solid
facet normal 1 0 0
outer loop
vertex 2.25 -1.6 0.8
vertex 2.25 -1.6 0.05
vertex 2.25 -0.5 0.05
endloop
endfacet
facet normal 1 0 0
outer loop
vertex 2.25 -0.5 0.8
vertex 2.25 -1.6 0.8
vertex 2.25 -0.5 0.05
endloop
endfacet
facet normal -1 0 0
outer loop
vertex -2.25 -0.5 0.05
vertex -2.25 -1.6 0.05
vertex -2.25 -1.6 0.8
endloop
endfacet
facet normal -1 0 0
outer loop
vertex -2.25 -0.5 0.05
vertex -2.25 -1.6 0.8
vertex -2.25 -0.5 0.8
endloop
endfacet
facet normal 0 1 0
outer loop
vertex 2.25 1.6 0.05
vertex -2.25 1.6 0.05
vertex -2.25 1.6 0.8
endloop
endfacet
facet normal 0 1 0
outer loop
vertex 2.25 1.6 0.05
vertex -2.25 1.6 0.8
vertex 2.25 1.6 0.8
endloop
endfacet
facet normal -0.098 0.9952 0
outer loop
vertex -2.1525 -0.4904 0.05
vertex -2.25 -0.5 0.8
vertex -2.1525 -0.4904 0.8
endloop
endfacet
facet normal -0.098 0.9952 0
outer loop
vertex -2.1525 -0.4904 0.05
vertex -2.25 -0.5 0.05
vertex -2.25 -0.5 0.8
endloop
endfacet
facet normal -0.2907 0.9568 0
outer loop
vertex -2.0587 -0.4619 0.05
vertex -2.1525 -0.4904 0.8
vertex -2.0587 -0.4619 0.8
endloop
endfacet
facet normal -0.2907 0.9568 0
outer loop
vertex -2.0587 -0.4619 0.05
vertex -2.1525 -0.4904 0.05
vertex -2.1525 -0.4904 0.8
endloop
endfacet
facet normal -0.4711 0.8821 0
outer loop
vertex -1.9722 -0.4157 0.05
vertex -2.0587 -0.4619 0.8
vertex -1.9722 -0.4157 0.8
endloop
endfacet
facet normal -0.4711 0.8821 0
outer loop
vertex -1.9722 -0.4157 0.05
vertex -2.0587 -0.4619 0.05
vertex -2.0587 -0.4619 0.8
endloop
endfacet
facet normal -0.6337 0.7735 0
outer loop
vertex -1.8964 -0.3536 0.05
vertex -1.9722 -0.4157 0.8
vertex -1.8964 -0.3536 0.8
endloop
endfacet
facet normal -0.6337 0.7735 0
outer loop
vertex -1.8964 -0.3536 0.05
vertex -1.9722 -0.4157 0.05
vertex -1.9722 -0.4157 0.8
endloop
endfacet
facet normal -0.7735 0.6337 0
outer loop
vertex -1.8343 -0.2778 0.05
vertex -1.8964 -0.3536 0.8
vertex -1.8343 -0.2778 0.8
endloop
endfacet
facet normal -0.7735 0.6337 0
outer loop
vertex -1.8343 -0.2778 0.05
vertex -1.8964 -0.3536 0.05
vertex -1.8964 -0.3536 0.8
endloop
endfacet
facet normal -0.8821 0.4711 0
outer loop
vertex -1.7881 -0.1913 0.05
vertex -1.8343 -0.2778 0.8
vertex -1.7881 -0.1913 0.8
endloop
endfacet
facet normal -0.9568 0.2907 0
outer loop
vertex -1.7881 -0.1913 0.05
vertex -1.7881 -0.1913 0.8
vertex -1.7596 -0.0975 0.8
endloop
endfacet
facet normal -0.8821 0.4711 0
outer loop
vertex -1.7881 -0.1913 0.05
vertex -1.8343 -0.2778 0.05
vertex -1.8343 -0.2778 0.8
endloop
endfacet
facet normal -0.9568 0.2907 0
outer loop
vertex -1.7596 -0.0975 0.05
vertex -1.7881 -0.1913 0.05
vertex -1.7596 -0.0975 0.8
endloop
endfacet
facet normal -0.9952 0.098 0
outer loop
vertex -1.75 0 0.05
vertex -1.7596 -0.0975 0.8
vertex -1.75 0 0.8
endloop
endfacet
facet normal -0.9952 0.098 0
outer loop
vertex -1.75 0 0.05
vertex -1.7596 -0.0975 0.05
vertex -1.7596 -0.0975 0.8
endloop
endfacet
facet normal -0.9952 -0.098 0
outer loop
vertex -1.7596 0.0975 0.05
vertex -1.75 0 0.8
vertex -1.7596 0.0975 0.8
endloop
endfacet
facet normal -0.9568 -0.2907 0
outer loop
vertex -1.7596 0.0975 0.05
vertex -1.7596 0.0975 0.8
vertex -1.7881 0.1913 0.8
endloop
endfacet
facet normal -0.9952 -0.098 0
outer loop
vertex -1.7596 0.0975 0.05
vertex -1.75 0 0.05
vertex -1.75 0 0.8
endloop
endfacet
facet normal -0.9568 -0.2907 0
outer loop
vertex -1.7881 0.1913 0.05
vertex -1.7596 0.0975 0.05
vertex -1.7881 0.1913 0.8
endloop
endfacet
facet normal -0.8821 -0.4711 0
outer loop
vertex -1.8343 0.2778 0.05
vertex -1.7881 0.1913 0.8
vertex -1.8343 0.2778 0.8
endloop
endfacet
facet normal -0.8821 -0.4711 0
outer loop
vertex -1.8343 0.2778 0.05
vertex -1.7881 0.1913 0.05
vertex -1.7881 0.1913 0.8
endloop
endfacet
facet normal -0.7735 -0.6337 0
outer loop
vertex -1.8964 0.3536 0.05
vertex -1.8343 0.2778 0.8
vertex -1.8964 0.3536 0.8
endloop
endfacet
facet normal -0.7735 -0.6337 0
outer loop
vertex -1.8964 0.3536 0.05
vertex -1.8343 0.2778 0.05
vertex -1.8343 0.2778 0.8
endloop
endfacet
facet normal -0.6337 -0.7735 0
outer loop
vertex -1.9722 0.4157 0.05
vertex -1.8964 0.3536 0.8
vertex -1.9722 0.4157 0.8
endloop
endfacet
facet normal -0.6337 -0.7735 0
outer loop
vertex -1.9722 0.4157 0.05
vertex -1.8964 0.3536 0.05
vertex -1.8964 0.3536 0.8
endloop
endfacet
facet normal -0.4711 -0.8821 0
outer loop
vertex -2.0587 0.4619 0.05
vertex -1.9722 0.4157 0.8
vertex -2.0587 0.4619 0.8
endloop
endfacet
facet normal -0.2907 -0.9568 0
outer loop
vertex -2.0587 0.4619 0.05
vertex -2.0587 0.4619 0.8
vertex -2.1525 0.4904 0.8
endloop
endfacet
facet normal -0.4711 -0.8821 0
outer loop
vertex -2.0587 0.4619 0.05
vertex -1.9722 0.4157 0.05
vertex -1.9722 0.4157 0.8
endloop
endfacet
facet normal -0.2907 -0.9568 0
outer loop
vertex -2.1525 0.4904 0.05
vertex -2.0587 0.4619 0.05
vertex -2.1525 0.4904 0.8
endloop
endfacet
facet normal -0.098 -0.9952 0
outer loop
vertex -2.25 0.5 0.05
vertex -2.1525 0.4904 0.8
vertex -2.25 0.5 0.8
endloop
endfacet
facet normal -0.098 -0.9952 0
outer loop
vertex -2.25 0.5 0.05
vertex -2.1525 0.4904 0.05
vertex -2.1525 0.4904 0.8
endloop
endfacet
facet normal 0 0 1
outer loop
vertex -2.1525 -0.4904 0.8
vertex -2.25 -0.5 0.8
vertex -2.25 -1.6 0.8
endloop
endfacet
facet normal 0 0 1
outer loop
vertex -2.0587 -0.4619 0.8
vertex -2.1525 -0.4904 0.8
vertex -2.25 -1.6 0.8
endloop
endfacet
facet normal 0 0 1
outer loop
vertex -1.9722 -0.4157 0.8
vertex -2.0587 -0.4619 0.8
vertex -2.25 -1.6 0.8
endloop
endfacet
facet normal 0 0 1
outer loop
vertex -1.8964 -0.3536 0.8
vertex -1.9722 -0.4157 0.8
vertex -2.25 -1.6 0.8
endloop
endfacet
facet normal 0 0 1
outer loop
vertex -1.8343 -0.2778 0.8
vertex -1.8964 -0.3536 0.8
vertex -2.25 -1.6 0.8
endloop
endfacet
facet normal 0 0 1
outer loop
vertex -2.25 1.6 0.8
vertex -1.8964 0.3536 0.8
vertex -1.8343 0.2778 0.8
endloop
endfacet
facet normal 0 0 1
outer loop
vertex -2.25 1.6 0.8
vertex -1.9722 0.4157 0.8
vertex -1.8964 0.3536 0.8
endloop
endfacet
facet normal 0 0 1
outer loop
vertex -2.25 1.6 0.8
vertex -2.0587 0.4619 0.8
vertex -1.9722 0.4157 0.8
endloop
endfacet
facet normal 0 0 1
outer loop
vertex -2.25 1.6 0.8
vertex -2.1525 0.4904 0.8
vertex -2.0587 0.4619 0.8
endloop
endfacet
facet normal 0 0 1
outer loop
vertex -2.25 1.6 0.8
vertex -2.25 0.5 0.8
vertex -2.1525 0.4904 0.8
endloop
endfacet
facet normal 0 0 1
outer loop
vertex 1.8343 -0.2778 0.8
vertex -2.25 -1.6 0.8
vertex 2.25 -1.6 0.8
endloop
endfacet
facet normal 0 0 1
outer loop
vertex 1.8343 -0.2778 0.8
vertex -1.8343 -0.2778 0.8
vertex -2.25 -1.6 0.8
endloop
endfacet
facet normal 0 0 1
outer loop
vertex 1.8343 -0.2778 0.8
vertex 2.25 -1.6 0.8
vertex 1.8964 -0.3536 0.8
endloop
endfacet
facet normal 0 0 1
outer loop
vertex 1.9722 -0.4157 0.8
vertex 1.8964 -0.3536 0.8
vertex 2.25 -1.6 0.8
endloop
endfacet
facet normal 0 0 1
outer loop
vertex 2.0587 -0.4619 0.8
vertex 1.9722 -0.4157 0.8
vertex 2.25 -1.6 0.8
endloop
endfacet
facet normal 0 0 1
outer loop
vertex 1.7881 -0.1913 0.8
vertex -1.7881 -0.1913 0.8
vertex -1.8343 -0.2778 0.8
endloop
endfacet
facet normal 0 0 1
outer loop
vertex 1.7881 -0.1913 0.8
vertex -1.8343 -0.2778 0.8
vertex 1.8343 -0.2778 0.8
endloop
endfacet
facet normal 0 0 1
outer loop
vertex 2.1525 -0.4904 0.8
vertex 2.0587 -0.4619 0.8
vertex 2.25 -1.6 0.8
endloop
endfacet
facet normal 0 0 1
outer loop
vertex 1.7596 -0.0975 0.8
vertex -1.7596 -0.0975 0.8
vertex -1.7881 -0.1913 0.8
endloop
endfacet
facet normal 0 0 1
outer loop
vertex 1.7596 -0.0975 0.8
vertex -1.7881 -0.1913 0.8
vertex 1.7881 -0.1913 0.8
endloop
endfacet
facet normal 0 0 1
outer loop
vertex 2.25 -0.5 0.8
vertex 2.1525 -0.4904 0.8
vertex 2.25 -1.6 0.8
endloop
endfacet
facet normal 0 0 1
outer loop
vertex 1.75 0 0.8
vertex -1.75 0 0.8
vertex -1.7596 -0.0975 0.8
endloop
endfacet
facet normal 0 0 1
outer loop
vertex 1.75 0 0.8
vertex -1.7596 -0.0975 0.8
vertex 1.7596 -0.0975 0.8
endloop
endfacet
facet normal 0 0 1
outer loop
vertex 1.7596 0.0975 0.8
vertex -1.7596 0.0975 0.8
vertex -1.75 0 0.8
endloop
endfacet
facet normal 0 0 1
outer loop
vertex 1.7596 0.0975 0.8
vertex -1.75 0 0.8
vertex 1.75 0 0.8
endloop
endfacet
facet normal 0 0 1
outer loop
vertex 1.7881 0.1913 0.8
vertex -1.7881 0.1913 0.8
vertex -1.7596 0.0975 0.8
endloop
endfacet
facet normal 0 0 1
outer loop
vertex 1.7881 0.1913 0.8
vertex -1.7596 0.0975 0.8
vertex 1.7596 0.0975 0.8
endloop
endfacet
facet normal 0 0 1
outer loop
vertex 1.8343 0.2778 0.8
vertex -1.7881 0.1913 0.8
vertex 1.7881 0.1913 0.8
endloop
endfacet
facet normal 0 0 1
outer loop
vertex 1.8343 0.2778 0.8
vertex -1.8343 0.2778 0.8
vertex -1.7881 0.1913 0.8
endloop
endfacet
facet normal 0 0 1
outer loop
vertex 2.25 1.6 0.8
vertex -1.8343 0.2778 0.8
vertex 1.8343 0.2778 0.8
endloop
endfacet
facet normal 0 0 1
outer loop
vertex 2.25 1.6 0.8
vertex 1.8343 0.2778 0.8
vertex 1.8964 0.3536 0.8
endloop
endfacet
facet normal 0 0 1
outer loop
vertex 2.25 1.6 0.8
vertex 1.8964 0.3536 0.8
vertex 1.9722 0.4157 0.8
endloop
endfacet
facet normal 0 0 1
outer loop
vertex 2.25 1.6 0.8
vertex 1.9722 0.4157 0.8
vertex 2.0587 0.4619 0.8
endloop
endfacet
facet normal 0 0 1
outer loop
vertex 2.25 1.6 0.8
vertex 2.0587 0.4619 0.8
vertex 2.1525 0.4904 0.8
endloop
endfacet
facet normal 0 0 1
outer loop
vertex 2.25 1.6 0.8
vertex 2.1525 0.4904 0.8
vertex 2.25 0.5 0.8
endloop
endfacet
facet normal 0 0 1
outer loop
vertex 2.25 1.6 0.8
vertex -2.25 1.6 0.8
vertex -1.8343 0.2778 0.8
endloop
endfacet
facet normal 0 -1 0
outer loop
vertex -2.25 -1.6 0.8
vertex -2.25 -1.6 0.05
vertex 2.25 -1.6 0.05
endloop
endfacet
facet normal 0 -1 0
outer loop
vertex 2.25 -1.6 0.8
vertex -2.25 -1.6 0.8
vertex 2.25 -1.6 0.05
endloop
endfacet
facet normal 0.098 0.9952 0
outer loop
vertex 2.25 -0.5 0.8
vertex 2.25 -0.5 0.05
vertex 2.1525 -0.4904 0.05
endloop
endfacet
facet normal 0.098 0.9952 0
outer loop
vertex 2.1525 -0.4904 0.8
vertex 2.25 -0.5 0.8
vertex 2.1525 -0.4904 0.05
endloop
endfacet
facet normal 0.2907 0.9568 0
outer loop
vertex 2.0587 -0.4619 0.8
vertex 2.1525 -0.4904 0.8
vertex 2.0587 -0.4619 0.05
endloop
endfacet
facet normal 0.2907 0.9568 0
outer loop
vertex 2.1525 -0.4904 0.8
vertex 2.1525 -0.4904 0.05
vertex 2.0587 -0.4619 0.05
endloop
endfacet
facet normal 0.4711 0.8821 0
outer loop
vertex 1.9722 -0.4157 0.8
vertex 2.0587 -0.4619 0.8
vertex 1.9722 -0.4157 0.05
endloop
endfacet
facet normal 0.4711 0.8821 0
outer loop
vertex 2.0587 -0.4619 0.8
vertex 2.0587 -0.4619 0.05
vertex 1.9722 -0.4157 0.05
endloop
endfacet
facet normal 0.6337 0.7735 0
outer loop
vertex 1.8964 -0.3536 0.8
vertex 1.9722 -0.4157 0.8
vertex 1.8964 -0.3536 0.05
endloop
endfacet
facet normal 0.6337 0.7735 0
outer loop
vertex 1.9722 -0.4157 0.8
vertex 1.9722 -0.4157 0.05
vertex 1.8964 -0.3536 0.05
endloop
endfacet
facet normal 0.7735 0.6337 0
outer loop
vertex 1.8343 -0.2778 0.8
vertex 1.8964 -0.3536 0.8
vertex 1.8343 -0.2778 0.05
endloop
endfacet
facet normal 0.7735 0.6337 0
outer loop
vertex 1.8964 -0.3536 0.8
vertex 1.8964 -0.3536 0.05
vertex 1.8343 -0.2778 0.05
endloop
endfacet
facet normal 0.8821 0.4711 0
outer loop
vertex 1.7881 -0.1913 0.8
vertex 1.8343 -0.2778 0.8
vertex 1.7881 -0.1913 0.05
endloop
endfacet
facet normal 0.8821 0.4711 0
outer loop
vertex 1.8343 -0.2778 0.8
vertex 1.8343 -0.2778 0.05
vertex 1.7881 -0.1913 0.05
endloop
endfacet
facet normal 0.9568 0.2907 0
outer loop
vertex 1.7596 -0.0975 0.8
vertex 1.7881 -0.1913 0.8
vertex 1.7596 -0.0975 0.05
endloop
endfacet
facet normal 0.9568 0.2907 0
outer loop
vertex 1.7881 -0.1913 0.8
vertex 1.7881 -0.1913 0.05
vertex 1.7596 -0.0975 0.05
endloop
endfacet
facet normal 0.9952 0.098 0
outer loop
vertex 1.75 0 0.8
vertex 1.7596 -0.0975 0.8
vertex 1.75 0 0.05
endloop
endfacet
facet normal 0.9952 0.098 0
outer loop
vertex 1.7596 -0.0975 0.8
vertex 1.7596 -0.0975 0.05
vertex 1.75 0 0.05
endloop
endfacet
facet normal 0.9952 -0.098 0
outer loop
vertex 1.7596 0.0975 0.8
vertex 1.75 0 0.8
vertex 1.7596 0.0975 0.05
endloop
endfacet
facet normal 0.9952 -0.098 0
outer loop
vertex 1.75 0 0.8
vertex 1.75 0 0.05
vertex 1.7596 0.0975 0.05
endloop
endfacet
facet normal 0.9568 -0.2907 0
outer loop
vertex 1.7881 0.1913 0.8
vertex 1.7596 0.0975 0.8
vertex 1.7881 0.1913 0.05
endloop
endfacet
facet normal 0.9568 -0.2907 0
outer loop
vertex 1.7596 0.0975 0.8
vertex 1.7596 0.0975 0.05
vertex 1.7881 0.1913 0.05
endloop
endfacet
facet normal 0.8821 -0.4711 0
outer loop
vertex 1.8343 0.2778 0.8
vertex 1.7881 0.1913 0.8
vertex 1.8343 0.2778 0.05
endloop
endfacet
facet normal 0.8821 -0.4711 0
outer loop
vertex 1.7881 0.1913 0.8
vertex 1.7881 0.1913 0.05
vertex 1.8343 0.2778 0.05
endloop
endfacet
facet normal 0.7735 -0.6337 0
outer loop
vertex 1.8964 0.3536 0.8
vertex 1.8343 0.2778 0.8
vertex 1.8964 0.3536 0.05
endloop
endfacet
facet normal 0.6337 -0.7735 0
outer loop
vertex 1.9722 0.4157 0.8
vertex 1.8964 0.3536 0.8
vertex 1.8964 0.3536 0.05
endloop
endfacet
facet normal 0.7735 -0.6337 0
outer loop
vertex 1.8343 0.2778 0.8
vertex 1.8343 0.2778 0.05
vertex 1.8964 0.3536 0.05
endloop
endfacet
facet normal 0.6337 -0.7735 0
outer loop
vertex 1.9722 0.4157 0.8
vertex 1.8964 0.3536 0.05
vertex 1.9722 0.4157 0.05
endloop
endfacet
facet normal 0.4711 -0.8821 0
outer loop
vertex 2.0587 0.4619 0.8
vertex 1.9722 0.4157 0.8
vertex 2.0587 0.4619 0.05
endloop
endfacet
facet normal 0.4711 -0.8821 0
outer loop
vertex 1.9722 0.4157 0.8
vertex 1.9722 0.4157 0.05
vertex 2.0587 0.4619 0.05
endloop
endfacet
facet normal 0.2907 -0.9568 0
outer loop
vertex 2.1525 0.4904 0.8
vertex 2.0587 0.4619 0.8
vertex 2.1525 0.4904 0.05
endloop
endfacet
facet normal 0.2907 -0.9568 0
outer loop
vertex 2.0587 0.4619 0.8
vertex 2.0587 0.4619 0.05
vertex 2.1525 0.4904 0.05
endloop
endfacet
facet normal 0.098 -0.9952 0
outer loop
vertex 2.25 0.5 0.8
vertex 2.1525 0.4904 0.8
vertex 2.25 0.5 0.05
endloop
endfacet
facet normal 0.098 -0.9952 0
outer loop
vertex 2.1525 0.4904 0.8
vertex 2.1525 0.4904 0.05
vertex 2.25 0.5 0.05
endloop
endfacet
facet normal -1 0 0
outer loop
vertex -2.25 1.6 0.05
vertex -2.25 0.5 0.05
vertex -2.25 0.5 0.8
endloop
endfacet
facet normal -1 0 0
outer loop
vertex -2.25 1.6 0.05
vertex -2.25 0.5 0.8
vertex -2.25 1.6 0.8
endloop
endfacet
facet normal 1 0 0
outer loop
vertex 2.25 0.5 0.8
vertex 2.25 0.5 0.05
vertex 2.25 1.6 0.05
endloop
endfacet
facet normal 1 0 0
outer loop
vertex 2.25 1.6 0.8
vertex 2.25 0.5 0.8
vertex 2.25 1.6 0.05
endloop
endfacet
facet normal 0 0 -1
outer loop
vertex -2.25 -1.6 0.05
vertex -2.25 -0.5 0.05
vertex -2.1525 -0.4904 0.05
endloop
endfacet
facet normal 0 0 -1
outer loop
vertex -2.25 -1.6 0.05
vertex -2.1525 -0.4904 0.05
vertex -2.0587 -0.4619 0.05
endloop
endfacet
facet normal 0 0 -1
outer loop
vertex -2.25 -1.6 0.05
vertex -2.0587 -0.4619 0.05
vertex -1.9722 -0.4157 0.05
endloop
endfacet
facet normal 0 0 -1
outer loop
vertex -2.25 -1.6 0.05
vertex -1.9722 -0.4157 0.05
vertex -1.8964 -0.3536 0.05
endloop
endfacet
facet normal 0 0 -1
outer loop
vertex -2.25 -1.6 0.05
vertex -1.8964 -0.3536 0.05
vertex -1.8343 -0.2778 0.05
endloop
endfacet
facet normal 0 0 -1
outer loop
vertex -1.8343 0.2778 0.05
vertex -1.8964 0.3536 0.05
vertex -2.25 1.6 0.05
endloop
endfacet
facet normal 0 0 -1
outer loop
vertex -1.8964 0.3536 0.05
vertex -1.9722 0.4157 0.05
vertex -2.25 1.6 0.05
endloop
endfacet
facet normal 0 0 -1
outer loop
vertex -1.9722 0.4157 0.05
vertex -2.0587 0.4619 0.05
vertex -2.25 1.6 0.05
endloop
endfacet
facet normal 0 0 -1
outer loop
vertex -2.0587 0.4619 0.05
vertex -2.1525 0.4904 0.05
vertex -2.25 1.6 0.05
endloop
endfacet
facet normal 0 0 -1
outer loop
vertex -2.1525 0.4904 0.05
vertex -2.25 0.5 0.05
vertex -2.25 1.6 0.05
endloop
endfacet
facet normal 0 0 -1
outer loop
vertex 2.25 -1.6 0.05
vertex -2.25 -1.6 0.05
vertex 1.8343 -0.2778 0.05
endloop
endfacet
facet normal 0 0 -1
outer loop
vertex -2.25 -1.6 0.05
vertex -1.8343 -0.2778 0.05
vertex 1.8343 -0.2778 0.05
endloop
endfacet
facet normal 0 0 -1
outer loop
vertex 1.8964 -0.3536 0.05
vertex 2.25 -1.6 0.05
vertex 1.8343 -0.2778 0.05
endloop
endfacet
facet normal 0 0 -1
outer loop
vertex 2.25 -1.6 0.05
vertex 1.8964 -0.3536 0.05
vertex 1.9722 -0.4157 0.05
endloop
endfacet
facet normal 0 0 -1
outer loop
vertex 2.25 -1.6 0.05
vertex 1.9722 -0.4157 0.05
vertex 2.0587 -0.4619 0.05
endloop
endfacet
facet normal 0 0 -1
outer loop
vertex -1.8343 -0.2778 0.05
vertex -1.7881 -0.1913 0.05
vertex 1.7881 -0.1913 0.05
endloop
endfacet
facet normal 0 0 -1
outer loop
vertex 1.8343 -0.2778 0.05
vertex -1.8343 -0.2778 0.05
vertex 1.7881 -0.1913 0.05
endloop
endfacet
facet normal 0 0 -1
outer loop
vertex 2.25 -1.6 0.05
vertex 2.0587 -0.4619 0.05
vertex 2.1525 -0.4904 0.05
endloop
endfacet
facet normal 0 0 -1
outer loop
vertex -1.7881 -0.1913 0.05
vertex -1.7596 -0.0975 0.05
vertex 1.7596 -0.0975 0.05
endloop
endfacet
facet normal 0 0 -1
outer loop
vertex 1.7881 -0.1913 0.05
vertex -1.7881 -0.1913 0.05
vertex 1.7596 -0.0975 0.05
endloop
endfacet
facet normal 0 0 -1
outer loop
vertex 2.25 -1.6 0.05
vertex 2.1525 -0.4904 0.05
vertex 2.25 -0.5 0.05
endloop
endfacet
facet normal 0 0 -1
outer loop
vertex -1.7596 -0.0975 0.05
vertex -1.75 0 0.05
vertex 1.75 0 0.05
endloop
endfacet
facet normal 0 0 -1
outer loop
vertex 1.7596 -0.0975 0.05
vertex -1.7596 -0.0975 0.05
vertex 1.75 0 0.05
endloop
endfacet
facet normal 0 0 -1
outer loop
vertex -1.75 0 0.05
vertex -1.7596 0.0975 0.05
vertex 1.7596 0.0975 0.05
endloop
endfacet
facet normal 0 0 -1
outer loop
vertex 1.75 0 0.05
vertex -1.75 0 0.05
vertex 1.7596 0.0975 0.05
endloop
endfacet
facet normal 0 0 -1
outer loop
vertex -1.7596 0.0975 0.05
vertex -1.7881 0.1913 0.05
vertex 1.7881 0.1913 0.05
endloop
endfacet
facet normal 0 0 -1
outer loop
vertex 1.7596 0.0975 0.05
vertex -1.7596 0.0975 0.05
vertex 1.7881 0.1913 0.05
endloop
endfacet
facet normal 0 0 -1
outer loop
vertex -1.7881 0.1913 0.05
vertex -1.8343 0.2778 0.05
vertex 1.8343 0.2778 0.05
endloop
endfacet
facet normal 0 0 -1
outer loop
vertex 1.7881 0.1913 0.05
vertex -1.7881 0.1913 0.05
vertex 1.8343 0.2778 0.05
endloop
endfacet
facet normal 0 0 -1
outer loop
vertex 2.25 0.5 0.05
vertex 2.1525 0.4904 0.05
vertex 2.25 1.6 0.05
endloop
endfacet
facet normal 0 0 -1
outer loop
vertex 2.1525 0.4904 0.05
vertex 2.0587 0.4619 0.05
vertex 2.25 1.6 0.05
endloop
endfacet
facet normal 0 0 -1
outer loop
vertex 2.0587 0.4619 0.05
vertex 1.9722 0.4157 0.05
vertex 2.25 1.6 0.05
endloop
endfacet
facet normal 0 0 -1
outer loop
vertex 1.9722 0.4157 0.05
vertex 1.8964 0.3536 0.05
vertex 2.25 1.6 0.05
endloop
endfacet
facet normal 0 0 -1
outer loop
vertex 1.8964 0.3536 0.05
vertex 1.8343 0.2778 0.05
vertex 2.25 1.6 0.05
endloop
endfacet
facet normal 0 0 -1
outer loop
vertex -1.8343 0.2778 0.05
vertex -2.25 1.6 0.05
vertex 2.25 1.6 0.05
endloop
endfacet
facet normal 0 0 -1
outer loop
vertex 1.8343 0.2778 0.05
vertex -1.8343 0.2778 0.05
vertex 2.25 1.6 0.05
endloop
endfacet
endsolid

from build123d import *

# Parameters (mm, degrees)
BOX118_W          = 4.5
BOX118_H          = 3.2
BOX118_DEPTH      = 0.75
CYLINDER052_R     = 0.5
CYLINDER052_DEPTH = 1


with BuildPart() as part:
    # Box118 → Box118 (join)
    with BuildSketch(Plane(origin=(-2.25, -1.6, 0.05), x_dir=(1, 0, 0), z_dir=(0, 0, 1))):
        with Locations((2.25, 1.6)):
            Rectangle(BOX118_W, BOX118_H)
    extrude(amount=BOX118_DEPTH)

    # Cylinder052 → Cylinder052 (cut)
    with BuildSketch(Plane(origin=(-2.25, 0, 0), x_dir=(1, 0, 0), z_dir=(0, 0, 1))):
        Circle(CYLINDER052_R)
    cylinder052 = extrude(amount=CYLINDER052_DEPTH, mode=Mode.SUBTRACT)

    # Mirrored002: Cylinder052 across YZ
    add(cylinder052.mirror(Plane.YZ), mode=Mode.SUBTRACT)


solid = part.part
